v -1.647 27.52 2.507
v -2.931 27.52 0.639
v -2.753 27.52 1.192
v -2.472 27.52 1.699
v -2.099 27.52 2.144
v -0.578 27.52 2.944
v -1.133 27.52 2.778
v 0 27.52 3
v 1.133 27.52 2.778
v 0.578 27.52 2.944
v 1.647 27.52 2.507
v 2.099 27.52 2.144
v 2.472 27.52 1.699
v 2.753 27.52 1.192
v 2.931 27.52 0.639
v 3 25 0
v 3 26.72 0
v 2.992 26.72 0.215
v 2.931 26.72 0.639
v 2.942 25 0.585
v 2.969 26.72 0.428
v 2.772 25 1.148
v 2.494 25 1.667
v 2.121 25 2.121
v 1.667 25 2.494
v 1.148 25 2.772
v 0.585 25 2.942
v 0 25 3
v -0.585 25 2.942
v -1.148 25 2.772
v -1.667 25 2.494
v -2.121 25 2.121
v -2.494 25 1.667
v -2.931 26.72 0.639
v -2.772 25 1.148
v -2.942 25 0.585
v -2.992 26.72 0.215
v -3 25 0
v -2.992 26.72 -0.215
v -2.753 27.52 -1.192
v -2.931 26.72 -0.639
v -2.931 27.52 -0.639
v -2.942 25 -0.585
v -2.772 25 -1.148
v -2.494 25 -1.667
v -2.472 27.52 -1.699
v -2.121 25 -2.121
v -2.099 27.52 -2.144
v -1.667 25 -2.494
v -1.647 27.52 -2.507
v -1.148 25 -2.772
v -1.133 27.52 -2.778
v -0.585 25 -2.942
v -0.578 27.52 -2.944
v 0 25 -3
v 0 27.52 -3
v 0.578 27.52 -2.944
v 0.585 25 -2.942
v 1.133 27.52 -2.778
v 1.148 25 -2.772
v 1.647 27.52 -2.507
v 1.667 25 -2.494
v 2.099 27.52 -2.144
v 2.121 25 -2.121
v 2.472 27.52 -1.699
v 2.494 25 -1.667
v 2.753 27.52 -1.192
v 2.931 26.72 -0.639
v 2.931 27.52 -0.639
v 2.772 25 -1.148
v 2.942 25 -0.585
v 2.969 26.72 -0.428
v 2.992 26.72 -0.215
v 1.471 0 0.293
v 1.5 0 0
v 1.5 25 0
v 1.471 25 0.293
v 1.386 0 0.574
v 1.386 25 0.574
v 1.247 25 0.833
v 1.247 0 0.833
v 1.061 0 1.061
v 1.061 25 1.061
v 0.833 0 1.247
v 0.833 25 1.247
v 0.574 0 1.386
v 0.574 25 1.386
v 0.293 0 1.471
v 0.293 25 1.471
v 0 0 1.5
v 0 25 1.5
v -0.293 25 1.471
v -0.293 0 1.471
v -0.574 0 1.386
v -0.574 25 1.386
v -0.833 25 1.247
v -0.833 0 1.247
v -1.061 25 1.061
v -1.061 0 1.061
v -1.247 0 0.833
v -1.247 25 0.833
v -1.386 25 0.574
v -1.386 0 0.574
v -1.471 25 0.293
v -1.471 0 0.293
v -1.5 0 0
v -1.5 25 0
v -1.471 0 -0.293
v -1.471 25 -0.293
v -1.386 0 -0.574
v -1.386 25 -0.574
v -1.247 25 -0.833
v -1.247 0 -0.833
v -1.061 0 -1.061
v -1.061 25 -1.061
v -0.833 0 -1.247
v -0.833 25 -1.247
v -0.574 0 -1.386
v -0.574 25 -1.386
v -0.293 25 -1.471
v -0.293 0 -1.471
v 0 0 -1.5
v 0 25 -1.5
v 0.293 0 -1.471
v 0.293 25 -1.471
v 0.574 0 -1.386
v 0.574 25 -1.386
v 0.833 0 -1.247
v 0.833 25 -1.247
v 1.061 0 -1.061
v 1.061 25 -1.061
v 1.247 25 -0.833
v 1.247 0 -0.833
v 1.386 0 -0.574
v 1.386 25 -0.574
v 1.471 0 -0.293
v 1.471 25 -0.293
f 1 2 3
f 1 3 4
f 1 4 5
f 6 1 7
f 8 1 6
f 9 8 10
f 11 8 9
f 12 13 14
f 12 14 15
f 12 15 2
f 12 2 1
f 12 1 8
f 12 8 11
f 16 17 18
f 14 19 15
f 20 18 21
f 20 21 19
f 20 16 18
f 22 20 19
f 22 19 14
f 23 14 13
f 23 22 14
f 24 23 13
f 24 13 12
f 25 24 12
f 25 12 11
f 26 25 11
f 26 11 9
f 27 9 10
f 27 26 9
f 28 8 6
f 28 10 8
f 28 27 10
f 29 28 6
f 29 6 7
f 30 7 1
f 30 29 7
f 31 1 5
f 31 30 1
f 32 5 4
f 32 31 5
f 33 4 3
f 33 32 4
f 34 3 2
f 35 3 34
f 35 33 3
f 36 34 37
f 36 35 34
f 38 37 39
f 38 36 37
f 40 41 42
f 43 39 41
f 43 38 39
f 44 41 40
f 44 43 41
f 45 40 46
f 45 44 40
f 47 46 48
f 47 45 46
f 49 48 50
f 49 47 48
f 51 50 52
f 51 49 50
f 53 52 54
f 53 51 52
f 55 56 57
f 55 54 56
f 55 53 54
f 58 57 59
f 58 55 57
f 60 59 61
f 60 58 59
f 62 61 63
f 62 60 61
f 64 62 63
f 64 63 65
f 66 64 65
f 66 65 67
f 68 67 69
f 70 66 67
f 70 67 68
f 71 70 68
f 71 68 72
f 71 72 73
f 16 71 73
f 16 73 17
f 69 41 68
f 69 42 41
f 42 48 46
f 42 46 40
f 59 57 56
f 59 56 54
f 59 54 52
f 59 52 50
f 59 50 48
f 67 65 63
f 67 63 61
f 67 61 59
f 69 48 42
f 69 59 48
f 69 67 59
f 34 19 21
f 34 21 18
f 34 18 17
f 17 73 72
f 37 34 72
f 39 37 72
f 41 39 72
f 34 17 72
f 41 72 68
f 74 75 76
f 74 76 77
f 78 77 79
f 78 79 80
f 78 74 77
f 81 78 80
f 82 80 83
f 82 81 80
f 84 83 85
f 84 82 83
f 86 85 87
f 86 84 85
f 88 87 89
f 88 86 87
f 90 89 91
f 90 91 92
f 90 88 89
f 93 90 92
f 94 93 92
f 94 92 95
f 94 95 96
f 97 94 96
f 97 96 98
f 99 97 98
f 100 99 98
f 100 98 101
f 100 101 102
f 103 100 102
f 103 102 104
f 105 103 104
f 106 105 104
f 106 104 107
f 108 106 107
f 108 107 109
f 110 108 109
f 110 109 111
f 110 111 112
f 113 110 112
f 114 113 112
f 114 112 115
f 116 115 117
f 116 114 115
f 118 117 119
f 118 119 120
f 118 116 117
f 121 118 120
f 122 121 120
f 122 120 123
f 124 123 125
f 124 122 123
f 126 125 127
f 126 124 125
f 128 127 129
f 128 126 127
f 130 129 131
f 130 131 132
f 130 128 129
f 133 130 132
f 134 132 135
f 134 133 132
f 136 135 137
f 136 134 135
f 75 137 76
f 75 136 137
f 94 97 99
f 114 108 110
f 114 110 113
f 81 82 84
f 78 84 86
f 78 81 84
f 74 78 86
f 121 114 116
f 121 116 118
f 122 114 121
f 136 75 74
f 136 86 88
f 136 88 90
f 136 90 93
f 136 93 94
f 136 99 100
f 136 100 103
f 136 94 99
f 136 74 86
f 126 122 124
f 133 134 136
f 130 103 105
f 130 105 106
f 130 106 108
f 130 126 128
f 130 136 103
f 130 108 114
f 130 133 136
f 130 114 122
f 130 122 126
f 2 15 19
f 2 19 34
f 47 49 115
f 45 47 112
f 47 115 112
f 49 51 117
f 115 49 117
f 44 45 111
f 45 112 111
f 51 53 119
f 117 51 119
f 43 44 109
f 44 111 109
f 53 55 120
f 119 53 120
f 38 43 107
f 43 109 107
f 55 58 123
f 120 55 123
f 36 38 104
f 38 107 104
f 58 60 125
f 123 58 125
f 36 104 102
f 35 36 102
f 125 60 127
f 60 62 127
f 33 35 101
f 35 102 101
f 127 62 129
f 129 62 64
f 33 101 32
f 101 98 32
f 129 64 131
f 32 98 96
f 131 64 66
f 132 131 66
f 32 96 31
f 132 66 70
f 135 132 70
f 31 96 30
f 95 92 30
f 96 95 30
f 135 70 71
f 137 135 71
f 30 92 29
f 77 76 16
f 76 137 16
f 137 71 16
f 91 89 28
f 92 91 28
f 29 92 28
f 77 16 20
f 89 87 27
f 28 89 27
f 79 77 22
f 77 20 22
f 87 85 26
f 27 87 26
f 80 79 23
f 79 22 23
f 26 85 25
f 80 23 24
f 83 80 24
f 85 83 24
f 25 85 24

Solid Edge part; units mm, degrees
sketch "Sketch1" plane through (0, 0, 0) normal (0, -1, 0) x (1, 0, 0)
  circle A0 centre (0, 0) radius 1.5
extrude "Protrusion1" add sketch "Sketch1" against normal blind 25
sketch "Sketch2" plane through (0, 25, 0) normal (0, 1, 0) x (1, 0, 0)
  circle A0 centre (0, 0) radius 3
extrude "ExtrudedProtrusion_2" add sketch "Sketch2" along normal blind 2.52
sketch "Sketch3" plane through (0, 27.52, 0) normal (0, 1, 0) x (-1, 0, 0)
  line L0 (-2.9311, 0.6393) -> (2.9311, 0.6393)
  arc A0 (2.9311, 0.6393) -> (2.9311, -0.6393) centre (0, 0) cw
  line L1 (2.9311, -0.6393) -> (-2.9311, -0.6393)
  arc A1 (-2.9311, -0.6393) -> (-2.9311, 0.6393) centre (0, 0) cw
extrude "ExtrudedCutout_1" cut sketch "Sketch3" against normal blind 0.8
cosmetic_thread "Thread1" size "M3"
properties material "Nylon, general purpose"
